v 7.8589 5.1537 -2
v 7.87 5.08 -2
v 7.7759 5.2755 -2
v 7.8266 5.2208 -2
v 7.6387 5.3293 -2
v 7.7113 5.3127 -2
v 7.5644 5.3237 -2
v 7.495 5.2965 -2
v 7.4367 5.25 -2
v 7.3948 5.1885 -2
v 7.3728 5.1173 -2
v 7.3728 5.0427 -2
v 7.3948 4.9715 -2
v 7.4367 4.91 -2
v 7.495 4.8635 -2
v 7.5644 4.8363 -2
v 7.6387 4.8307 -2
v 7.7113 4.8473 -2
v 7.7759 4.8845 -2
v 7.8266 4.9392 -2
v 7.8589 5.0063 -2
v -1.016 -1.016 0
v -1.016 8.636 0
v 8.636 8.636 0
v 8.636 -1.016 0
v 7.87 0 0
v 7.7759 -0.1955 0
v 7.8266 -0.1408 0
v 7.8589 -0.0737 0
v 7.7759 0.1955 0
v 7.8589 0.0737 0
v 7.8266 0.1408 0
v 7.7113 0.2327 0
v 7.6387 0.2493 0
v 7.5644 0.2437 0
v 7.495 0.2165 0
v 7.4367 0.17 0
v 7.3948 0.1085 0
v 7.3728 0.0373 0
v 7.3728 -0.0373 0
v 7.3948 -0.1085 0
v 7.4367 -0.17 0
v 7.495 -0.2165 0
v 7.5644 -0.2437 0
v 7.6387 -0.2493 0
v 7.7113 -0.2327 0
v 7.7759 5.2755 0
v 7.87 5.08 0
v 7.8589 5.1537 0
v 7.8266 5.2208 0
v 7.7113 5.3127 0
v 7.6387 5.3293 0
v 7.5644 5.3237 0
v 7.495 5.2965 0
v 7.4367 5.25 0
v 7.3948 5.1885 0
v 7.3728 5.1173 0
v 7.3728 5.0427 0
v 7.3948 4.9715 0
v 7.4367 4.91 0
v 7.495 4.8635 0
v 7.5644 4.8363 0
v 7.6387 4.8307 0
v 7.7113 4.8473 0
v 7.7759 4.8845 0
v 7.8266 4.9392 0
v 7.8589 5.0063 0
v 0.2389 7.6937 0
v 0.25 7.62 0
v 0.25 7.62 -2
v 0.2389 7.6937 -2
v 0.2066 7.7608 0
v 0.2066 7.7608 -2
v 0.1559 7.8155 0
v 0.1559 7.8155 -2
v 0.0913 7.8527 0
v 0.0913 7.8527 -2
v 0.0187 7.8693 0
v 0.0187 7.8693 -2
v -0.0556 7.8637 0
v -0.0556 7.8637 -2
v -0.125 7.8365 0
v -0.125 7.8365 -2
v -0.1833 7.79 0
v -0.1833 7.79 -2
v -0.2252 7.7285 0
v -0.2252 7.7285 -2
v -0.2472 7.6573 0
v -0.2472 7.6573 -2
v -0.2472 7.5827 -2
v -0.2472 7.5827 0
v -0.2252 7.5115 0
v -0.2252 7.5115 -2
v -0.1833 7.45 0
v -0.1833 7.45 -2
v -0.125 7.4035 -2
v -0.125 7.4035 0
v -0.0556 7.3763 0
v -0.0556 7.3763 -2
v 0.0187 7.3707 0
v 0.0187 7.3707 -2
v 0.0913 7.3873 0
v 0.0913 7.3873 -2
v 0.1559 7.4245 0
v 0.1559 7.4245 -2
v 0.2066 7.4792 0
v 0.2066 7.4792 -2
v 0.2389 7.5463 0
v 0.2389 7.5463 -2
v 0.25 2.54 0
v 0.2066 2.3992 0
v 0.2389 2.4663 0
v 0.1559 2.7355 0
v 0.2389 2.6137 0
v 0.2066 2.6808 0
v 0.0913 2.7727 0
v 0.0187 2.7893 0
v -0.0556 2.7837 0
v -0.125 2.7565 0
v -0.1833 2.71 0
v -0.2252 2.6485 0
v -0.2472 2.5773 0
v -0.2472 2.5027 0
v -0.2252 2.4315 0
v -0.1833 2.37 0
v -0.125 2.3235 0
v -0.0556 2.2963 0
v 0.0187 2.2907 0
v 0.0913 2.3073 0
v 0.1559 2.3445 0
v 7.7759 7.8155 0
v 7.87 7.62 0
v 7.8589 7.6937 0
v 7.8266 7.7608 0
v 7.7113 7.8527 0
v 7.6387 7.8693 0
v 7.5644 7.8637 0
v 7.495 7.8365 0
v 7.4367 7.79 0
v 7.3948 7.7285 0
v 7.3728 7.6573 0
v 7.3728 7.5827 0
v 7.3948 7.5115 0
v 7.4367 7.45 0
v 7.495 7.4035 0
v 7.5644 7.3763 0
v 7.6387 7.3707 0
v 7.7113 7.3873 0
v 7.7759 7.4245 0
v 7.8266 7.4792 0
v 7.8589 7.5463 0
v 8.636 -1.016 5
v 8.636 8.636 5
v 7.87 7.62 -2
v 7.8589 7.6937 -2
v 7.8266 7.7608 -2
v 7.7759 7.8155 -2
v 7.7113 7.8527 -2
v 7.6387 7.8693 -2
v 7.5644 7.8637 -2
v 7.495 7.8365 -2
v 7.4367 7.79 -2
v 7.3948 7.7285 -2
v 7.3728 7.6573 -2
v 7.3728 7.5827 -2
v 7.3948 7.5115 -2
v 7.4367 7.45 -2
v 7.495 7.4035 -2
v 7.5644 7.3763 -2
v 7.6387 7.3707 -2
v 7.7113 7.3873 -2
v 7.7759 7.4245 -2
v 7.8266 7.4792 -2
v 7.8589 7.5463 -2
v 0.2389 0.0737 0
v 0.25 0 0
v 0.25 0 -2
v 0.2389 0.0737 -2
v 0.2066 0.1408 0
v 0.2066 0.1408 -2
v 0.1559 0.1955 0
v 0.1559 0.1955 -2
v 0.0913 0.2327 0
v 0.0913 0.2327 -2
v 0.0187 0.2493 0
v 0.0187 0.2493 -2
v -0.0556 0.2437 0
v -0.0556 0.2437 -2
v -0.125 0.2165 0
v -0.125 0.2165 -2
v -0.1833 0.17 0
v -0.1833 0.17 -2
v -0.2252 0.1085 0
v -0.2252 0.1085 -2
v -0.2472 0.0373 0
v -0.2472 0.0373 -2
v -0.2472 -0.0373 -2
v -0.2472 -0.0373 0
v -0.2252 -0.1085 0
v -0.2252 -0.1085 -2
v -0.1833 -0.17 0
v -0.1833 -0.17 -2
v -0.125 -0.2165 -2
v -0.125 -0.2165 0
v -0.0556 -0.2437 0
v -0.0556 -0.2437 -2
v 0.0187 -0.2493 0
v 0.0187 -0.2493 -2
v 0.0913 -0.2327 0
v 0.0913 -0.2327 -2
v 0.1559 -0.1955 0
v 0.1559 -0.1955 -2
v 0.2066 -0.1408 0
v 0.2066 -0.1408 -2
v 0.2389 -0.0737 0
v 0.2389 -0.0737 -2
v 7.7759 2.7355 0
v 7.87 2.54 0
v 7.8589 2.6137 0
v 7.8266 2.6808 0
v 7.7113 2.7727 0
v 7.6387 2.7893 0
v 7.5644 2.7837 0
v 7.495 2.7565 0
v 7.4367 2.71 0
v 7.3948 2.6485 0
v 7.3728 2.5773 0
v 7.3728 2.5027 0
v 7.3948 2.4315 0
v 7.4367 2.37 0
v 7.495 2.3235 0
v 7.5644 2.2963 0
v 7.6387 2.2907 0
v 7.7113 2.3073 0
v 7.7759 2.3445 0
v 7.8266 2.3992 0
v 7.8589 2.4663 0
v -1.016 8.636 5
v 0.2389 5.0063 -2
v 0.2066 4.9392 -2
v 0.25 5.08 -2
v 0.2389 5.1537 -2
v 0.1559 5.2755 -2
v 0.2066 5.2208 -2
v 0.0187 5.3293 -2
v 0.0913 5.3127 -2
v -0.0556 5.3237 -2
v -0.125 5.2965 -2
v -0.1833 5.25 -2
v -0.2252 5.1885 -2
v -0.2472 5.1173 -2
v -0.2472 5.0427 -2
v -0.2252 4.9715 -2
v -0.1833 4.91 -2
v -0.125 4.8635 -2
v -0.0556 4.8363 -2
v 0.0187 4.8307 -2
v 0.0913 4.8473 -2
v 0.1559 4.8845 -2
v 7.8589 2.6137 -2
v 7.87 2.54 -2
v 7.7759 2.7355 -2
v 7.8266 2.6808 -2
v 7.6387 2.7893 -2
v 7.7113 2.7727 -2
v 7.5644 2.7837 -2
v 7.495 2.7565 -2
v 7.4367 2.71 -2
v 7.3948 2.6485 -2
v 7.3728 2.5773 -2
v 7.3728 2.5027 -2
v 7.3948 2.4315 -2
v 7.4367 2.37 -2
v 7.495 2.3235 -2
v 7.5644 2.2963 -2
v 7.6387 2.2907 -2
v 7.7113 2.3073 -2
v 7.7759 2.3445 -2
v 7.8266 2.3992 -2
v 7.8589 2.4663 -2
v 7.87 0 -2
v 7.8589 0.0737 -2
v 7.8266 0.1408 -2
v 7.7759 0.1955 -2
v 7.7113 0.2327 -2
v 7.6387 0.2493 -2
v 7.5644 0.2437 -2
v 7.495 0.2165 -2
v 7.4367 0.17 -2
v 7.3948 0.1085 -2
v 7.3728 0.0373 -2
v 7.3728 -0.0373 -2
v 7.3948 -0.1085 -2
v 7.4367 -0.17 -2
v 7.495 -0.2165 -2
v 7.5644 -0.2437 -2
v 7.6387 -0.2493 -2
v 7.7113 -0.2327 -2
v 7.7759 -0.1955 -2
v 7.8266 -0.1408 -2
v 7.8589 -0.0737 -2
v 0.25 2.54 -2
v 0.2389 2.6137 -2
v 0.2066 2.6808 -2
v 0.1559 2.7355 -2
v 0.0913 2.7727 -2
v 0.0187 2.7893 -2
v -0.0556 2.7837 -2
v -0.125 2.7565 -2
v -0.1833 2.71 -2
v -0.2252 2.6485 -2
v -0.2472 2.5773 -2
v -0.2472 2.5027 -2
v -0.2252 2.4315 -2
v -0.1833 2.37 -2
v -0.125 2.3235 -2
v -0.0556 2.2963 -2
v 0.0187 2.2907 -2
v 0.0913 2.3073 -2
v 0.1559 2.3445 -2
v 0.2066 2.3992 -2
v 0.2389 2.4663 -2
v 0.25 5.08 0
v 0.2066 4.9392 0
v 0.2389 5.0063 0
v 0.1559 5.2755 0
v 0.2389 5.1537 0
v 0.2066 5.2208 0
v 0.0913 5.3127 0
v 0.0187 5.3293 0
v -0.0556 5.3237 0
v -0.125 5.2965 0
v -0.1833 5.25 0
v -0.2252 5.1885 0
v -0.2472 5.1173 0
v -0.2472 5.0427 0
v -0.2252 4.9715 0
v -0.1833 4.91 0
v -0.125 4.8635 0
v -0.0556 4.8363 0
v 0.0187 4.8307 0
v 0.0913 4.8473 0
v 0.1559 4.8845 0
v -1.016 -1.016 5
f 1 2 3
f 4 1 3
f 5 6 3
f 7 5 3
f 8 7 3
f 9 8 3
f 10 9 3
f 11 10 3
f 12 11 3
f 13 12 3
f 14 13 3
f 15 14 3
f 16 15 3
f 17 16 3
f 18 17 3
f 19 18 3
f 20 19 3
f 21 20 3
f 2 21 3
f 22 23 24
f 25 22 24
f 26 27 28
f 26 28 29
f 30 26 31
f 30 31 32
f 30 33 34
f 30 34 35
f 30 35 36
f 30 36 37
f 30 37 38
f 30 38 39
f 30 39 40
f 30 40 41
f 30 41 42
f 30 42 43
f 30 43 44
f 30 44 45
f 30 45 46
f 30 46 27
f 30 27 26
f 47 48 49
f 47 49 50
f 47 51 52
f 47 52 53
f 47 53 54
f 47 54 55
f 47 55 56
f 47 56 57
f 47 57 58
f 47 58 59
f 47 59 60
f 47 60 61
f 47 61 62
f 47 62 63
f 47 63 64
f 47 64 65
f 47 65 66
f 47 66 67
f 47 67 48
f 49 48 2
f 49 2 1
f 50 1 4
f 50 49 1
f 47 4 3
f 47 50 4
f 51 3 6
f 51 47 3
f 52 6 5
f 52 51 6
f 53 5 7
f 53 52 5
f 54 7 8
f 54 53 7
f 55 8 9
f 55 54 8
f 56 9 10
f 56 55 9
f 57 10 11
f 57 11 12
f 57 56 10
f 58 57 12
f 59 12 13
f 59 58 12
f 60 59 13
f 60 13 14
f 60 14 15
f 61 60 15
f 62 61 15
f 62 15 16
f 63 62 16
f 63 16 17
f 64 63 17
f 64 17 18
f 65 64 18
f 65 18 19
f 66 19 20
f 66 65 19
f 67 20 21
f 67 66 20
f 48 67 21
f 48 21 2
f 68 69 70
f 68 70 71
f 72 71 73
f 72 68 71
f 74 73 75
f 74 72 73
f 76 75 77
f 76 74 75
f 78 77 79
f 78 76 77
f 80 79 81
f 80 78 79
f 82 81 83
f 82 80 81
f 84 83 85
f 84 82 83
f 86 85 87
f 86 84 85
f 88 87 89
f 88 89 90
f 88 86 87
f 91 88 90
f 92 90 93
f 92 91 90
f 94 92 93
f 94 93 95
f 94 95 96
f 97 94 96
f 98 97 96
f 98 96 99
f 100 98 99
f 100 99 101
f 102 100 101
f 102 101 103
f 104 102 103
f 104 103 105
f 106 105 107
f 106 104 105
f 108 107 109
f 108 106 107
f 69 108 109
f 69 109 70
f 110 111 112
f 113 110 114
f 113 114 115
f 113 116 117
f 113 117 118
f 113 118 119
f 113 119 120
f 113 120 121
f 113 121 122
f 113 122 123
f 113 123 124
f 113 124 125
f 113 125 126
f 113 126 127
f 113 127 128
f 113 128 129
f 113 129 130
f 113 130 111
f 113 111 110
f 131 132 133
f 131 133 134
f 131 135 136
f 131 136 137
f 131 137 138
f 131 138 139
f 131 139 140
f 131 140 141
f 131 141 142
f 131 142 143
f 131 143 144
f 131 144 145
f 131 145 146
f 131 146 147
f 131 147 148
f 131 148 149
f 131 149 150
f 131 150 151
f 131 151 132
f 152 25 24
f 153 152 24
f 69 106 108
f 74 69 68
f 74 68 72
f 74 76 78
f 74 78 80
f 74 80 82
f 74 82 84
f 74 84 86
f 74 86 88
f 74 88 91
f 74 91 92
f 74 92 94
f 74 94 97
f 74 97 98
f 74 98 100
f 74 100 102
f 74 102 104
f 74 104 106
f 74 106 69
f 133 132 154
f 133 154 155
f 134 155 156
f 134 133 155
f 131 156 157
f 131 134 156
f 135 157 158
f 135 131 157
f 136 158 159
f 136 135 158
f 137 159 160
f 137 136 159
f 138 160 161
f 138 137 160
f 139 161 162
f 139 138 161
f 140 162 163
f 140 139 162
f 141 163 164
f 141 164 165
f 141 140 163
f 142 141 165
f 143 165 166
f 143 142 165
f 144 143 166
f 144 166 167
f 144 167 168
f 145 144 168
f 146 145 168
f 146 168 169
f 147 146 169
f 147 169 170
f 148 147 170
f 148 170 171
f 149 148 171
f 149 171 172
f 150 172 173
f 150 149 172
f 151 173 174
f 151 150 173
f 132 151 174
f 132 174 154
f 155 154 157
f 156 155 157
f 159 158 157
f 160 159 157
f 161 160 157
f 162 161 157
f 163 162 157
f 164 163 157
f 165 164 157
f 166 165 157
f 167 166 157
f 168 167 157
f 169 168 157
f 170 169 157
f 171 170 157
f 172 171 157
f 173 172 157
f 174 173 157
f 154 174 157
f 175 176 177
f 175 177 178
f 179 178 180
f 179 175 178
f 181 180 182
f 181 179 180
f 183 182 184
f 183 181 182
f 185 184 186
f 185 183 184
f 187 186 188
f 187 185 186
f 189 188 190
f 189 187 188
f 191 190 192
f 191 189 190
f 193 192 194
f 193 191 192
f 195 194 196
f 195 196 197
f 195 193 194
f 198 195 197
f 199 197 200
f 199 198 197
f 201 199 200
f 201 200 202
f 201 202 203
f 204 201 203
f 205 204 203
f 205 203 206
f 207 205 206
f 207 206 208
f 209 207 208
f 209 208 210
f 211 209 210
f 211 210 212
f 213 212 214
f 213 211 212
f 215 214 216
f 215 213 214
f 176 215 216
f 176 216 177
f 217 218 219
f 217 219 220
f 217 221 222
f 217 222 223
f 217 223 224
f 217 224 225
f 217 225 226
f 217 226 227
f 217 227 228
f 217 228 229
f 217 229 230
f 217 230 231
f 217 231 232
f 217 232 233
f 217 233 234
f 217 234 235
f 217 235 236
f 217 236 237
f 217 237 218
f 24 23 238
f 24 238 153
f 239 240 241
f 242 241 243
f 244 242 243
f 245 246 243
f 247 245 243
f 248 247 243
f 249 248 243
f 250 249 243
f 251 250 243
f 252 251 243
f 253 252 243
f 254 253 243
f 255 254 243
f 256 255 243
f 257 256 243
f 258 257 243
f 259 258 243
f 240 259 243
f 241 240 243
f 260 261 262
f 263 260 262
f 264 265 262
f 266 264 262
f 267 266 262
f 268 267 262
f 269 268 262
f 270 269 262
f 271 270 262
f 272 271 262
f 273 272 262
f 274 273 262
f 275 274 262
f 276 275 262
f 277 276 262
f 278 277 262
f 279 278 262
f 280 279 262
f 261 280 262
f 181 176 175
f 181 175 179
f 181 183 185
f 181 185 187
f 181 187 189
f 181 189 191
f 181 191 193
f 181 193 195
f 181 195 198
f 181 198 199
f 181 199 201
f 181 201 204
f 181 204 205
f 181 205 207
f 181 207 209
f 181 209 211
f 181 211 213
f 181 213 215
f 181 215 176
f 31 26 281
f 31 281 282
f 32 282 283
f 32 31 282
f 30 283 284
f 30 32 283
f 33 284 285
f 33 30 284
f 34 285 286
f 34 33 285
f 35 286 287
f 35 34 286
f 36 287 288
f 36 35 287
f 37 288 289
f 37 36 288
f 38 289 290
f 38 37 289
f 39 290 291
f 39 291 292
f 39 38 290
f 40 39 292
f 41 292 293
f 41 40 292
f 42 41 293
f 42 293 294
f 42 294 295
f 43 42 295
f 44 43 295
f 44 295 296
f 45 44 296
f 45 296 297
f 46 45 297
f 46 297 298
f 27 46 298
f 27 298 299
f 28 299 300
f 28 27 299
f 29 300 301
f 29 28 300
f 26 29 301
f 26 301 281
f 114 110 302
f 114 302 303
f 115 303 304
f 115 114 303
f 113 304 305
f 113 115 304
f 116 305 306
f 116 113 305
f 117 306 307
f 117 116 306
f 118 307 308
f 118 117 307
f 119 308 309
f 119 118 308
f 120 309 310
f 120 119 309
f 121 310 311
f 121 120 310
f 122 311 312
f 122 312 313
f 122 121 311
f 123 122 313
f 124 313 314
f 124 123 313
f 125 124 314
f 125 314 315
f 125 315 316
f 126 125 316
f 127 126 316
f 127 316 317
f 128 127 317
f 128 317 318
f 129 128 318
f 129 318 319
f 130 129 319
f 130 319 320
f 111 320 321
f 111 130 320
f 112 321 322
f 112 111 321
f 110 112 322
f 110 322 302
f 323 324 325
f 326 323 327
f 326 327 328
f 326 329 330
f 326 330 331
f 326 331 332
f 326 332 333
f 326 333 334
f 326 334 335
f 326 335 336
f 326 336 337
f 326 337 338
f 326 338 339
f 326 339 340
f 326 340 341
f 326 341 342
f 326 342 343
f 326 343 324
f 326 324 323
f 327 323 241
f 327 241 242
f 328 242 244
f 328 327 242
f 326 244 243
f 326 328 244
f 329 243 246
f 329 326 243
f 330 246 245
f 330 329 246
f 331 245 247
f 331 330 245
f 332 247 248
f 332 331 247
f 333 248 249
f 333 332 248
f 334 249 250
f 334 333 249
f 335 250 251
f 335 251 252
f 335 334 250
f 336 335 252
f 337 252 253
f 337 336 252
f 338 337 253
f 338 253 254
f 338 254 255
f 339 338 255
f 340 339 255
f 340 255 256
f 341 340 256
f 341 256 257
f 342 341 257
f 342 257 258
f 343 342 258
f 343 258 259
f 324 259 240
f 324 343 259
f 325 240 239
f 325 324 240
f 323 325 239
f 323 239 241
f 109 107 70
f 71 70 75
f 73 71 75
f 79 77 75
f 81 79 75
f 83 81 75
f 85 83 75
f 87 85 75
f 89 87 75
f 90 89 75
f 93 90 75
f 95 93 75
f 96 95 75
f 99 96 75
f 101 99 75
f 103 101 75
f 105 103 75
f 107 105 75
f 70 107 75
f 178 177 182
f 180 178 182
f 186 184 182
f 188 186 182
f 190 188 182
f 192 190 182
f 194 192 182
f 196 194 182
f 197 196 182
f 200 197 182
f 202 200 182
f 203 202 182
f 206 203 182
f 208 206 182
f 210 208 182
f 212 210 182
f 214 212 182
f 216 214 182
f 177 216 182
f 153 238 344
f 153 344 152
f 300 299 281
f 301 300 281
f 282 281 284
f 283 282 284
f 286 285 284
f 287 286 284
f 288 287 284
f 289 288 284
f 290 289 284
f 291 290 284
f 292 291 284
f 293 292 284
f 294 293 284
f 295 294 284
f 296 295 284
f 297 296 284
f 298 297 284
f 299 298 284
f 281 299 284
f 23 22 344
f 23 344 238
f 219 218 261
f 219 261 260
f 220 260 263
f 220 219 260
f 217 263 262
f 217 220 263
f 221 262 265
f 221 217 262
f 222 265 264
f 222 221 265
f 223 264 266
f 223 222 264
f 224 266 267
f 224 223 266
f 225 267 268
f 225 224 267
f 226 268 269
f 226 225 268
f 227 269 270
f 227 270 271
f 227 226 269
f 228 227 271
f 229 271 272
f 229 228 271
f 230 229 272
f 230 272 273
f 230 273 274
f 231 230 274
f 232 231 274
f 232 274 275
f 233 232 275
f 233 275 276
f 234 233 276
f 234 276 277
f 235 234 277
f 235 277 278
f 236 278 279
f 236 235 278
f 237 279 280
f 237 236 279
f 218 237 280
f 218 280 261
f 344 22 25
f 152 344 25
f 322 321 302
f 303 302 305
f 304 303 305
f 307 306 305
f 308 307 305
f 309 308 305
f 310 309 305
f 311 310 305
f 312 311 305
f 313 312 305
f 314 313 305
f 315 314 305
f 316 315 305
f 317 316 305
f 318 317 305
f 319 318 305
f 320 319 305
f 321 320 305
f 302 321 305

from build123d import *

# Parameters (mm, degrees)
SKETCH1_W               = 9.652
SKETCH1_H               = 9.652
COMPONENT_OUTLINE_DEPTH = 5
SKETCH2_R               = 0.25
EXTRUDE_1_DEPTH         = 2
SKETCH3_R               = 0.25
EXTRUDE_2_DEPTH         = 2
SKETCH4_R               = 0.25
EXTRUDE_3_DEPTH         = 2
SKETCH5_R               = 0.25
EXTRUDE_4_DEPTH         = 2
SKETCH6_R               = 0.25
EXTRUDE_5_DEPTH         = 2
SKETCH7_R               = 0.25
EXTRUDE_6_DEPTH         = 2
SKETCH8_R               = 0.25
EXTRUDE_7_DEPTH         = 2
SKETCH9_R               = 0.25
EXTRUDE_8_DEPTH         = 2


with BuildPart() as part:
    # Sketch1 → Component_Outline (new body)
    with BuildSketch(Plane.XY):
        with Locations((3.81, 3.81)):
            Rectangle(SKETCH1_W, SKETCH1_H)
    extrude(amount=COMPONENT_OUTLINE_DEPTH)


with BuildPart() as body_2:
    # Sketch2 → Extrude 1 (new body)
    with BuildSketch(Plane.XY):
        Circle(SKETCH2_R)
    extrude(amount=-EXTRUDE_1_DEPTH)


with BuildPart() as body_3:
    # Sketch3 → Extrude 2 (new body)
    with BuildSketch(Plane.XY):
        with Locations((0, 2.54)):
            Circle(SKETCH3_R)
    extrude(amount=-EXTRUDE_2_DEPTH)


with BuildPart() as body_4:
    # Sketch4 → Extrude 3 (new body)
    with BuildSketch(Plane.XY):
        with Locations((0, 5.08)):
            Circle(SKETCH4_R)
    extrude(amount=-EXTRUDE_3_DEPTH)


with BuildPart() as body_5:
    # Sketch5 → Extrude 4 (new body)
    with BuildSketch(Plane.XY):
        with Locations((0, 7.62)):
            Circle(SKETCH5_R)
    extrude(amount=-EXTRUDE_4_DEPTH)


with BuildPart() as body_6:
    # Sketch6 → Extrude 5 (new body)
    with BuildSketch(Plane.XY):
        with Locations((7.62, 0)):
            Circle(SKETCH6_R)
    extrude(amount=-EXTRUDE_5_DEPTH)


with BuildPart() as body_7:
    # Sketch7 → Extrude 6 (new body)
    with BuildSketch(Plane.XY):
        with Locations((7.62, 2.54)):
            Circle(SKETCH7_R)
    extrude(amount=-EXTRUDE_6_DEPTH)


with BuildPart() as body_8:
    # Sketch8 → Extrude 7 (new body)
    with BuildSketch(Plane.XY):
        with Locations((7.62, 5.08)):
            Circle(SKETCH8_R)
    extrude(amount=-EXTRUDE_7_DEPTH)


with BuildPart() as body_9:
    # Sketch9 → Extrude 8 (new body)
    with BuildSketch(Plane.XY):
        with Locations((7.62, 7.62)):
            Circle(SKETCH9_R)
    extrude(amount=-EXTRUDE_8_DEPTH)


solid = Compound([part.part, body_2.part, body_3.part, body_4.part, body_5.part, body_6.part, body_7.part, body_8.part, body_9.part])
